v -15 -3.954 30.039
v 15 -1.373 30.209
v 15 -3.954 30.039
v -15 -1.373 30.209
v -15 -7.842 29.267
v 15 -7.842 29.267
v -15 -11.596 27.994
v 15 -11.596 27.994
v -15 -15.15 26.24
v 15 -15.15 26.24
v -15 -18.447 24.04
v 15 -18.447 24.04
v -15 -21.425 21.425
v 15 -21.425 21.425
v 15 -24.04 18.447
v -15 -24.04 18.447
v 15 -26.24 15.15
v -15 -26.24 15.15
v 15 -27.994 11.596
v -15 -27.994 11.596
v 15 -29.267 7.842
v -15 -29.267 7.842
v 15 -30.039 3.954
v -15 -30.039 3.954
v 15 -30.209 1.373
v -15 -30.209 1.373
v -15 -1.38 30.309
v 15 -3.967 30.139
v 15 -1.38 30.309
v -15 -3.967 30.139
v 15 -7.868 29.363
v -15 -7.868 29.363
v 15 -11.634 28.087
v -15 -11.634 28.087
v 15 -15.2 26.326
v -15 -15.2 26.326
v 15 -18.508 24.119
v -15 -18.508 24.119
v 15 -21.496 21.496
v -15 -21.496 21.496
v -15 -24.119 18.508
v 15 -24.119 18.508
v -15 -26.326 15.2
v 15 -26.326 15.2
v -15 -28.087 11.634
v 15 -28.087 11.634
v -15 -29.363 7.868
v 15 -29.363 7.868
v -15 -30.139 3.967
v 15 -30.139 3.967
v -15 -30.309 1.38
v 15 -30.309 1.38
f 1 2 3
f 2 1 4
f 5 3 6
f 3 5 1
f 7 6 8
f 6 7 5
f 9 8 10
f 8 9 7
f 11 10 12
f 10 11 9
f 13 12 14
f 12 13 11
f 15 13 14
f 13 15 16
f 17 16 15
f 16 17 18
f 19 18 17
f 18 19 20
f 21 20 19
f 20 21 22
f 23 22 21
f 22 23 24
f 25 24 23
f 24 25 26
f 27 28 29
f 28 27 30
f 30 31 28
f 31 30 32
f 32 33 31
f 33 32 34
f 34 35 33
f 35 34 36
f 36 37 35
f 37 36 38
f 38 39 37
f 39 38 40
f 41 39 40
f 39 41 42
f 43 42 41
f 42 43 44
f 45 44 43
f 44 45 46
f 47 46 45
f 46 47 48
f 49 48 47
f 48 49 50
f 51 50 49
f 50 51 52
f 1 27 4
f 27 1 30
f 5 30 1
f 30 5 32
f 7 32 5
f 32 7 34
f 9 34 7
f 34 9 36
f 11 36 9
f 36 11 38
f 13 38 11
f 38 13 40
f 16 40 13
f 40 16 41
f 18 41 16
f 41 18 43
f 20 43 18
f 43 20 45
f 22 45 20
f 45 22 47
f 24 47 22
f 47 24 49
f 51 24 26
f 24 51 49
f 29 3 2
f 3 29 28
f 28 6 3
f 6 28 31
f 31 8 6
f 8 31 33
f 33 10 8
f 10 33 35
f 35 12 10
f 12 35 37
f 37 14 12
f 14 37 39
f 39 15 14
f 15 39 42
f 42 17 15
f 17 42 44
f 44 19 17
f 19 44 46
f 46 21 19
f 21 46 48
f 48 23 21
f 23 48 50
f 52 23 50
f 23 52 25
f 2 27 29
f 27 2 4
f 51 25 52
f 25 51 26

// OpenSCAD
use <../lib.scad>
function ldraw_lib__6342869bc01() = [
// 0 Sticker  5.6 x  3.8 Rectangle Chrome (Formed)
// 0 Name: 6342869bc01.dat
// 0 Author: Orion Pobursky [OrionP]
// 0 !LDRAW_ORG Part UPDATE 2023-03
// 0 !LICENSE Licensed under CC BY 4.0 : see CAreadme.txt
// 
// 0 BFC CERTIFY CCW
  [0,"BFC","CERTIFY"],
  [0,"BFC","CCW"],
// 
// 0 !KEYWORDS Discovery, Space Shuttle, Set 10283
// 
// 0 !HISTORY 2023-06-24 [OrionP] Official Update 2023-03
// 
// 
// 4 383 -37.5 -75.0986 -9.8854 -37.5 -75.5237 -3.4334 37.5 -75.5237 -3.4334 37.5 -75.0986 -9.8854
  [4,383,-37.5,-75.0986,-9.8854,-37.5,-75.5237,-3.4334,37.5,-75.5237,-3.4334,37.5,-75.0986,-9.8854],
// 4 383 -37.5 -73.1669 -19.6041 -37.5 -75.0986 -9.8854 37.5 -75.0986 -9.8854 37.5 -73.1669 -19.6041
  [4,383,-37.5,-73.1669,-19.6041,-37.5,-75.0986,-9.8854,37.5,-75.0986,-9.8854,37.5,-73.1669,-19.6041],
// 4 383 -37.5 -69.9854 -28.9895 -37.5 -73.1669 -19.6041 37.5 -73.1669 -19.6041 37.5 -69.9854 -28.9895
  [4,383,-37.5,-69.9854,-28.9895,-37.5,-73.1669,-19.6041,37.5,-73.1669,-19.6041,37.5,-69.9854,-28.9895],
// 4 383 -37.5 -65.5995 -37.875 -37.5 -69.9854 -28.9895 37.5 -69.9854 -28.9895 37.5 -65.5995 -37.875
  [4,383,-37.5,-65.5995,-37.875,-37.5,-69.9854,-28.9895,37.5,-69.9854,-28.9895,37.5,-65.5995,-37.875],
// 4 383 -37.5 -60.1001 -46.1166 -37.5 -65.5995 -37.875 37.5 -65.5995 -37.875 37.5 -60.1001 -46.1166
  [4,383,-37.5,-60.1001,-46.1166,-37.5,-65.5995,-37.875,37.5,-65.5995,-37.875,37.5,-60.1001,-46.1166],
// 4 383 -37.5 -53.5628 -53.5628 -37.5 -60.1001 -46.1166 37.5 -60.1001 -46.1166 37.5 -53.5628 -53.5628
  [4,383,-37.5,-53.5628,-53.5628,-37.5,-60.1001,-46.1166,37.5,-60.1001,-46.1166,37.5,-53.5628,-53.5628],
// 4 383 -37.5 -46.1166 -60.1001 -37.5 -53.5628 -53.5628 37.5 -53.5628 -53.5628 37.5 -46.1166 -60.1001
  [4,383,-37.5,-46.1166,-60.1001,-37.5,-53.5628,-53.5628,37.5,-53.5628,-53.5628,37.5,-46.1166,-60.1001],
// 4 383 -37.5 -37.875 -65.5995 -37.5 -46.1166 -60.1001 37.5 -46.1166 -60.1001 37.5 -37.875 -65.5995
  [4,383,-37.5,-37.875,-65.5995,-37.5,-46.1166,-60.1001,37.5,-46.1166,-60.1001,37.5,-37.875,-65.5995],
// 4 383 -37.5 -28.9895 -69.9854 -37.5 -37.875 -65.5995 37.5 -37.875 -65.5995 37.5 -28.9895 -69.9854
  [4,383,-37.5,-28.9895,-69.9854,-37.5,-37.875,-65.5995,37.5,-37.875,-65.5995,37.5,-28.9895,-69.9854],
// 4 383 -37.5 -19.6041 -73.1669 -37.5 -28.9895 -69.9854 37.5 -28.9895 -69.9854 37.5 -19.6041 -73.1669
  [4,383,-37.5,-19.6041,-73.1669,-37.5,-28.9895,-69.9854,37.5,-28.9895,-69.9854,37.5,-19.6041,-73.1669],
// 4 383 -37.5 -9.8854 -75.0986 -37.5 -19.6041 -73.1669 37.5 -19.6041 -73.1669 37.5 -9.8854 -75.0986
  [4,383,-37.5,-9.8854,-75.0986,-37.5,-19.6041,-73.1669,37.5,-19.6041,-73.1669,37.5,-9.8854,-75.0986],
// 4 383 -37.5 -3.4334 -75.5237 -37.5 -9.8854 -75.0986 37.5 -9.8854 -75.0986 37.5 -3.4334 -75.5237
  [4,383,-37.5,-3.4334,-75.5237,-37.5,-9.8854,-75.0986,37.5,-9.8854,-75.0986,37.5,-3.4334,-75.5237],
// 
// 5 24 37.5 -75.0986 -9.8854 -37.5 -75.0986 -9.8854 37.5 -75.5237 -3.4334 37.5 -73.1669 -19.6041
  [5,24,37.5,-75.0986,-9.8854,-37.5,-75.0986,-9.8854,37.5,-75.5237,-3.4334,37.5,-73.1669,-19.6041],
// 5 24 37.5 -73.1669 -19.6041 -37.5 -73.1669 -19.6041 37.5 -75.0986 -9.8854 37.5 -69.9854 -28.9895
  [5,24,37.5,-73.1669,-19.6041,-37.5,-73.1669,-19.6041,37.5,-75.0986,-9.8854,37.5,-69.9854,-28.9895],
// 5 24 37.5 -69.9854 -28.9895 -37.5 -69.9854 -28.9895 37.5 -73.1669 -19.6041 37.5 -65.5995 -37.875
  [5,24,37.5,-69.9854,-28.9895,-37.5,-69.9854,-28.9895,37.5,-73.1669,-19.6041,37.5,-65.5995,-37.875],
// 5 24 37.5 -65.5995 -37.875 -37.5 -65.5995 -37.875 37.5 -69.9854 -28.9895 37.5 -60.1001 -46.1166
  [5,24,37.5,-65.5995,-37.875,-37.5,-65.5995,-37.875,37.5,-69.9854,-28.9895,37.5,-60.1001,-46.1166],
// 5 24 37.5 -60.1001 -46.1166 -37.5 -60.1001 -46.1166 37.5 -65.5995 -37.875 37.5 -53.5628 -53.5628
  [5,24,37.5,-60.1001,-46.1166,-37.5,-60.1001,-46.1166,37.5,-65.5995,-37.875,37.5,-53.5628,-53.5628],
// 5 24 37.5 -53.5628 -53.5628 -37.5 -53.5628 -53.5628 37.5 -60.1001 -46.1166 37.5 -46.1166 -60.1001
  [5,24,37.5,-53.5628,-53.5628,-37.5,-53.5628,-53.5628,37.5,-60.1001,-46.1166,37.5,-46.1166,-60.1001],
// 5 24 37.5 -46.1166 -60.1001 -37.5 -46.1166 -60.1001 37.5 -53.5628 -53.5628 37.5 -37.875 -65.5995
  [5,24,37.5,-46.1166,-60.1001,-37.5,-46.1166,-60.1001,37.5,-53.5628,-53.5628,37.5,-37.875,-65.5995],
// 5 24 37.5 -37.875 -65.5995 -37.5 -37.875 -65.5995 37.5 -46.1166 -60.1001 37.5 -28.9895 -69.9854
  [5,24,37.5,-37.875,-65.5995,-37.5,-37.875,-65.5995,37.5,-46.1166,-60.1001,37.5,-28.9895,-69.9854],
// 5 24 37.5 -28.9895 -69.9854 -37.5 -28.9895 -69.9854 37.5 -37.875 -65.5995 37.5 -19.6041 -73.1669
  [5,24,37.5,-28.9895,-69.9854,-37.5,-28.9895,-69.9854,37.5,-37.875,-65.5995,37.5,-19.6041,-73.1669],
// 5 24 37.5 -19.6041 -73.1669 -37.5 -19.6041 -73.1669 37.5 -28.9895 -69.9854 37.5 -9.8854 -75.0986
  [5,24,37.5,-19.6041,-73.1669,-37.5,-19.6041,-73.1669,37.5,-28.9895,-69.9854,37.5,-9.8854,-75.0986],
// 5 24 37.5 -9.8854 -75.0986 -37.5 -9.8854 -75.0986 37.5 -19.6041 -73.1669 37.5 -3.4334 -75.5237
  [5,24,37.5,-9.8854,-75.0986,-37.5,-9.8854,-75.0986,37.5,-19.6041,-73.1669,37.5,-3.4334,-75.5237],
// 
// 4 16 37.5 -75.7727 -3.4498 -37.5 -75.7727 -3.4498 -37.5 -75.3464 -9.918 37.5 -75.3464 -9.918
  [4,16,37.5,-75.7727,-3.4498,-37.5,-75.7727,-3.4498,-37.5,-75.3464,-9.918,37.5,-75.3464,-9.918],
// 4 16 37.5 -75.3464 -9.918 -37.5 -75.3464 -9.918 -37.5 -73.4084 -19.6688 37.5 -73.4084 -19.6688
  [4,16,37.5,-75.3464,-9.918,-37.5,-75.3464,-9.918,-37.5,-73.4084,-19.6688,37.5,-73.4084,-19.6688],
// 4 16 37.5 -73.4084 -19.6688 -37.5 -73.4084 -19.6688 -37.5 -70.2164 -29.0852 37.5 -70.2164 -29.0852
  [4,16,37.5,-73.4084,-19.6688,-37.5,-73.4084,-19.6688,-37.5,-70.2164,-29.0852,37.5,-70.2164,-29.0852],
// 4 16 37.5 -70.2164 -29.0852 -37.5 -70.2164 -29.0852 -37.5 -65.816 -38 37.5 -65.816 -38
  [4,16,37.5,-70.2164,-29.0852,-37.5,-70.2164,-29.0852,-37.5,-65.816,-38,37.5,-65.816,-38],
// 4 16 37.5 -65.816 -38 -37.5 -65.816 -38 -37.5 -60.2984 -46.2688 37.5 -60.2984 -46.2688
  [4,16,37.5,-65.816,-38,-37.5,-65.816,-38,-37.5,-60.2984,-46.2688,37.5,-60.2984,-46.2688],
// 4 16 37.5 -60.2984 -46.2688 -37.5 -60.2984 -46.2688 -37.5 -53.7396 -53.7396 37.5 -53.7396 -53.7396
  [4,16,37.5,-60.2984,-46.2688,-37.5,-60.2984,-46.2688,-37.5,-53.7396,-53.7396,37.5,-53.7396,-53.7396],
// 4 16 37.5 -53.7396 -53.7396 -37.5 -53.7396 -53.7396 -37.5 -46.2688 -60.2984 37.5 -46.2688 -60.2984
  [4,16,37.5,-53.7396,-53.7396,-37.5,-53.7396,-53.7396,-37.5,-46.2688,-60.2984,37.5,-46.2688,-60.2984],
// 4 16 37.5 -46.2688 -60.2984 -37.5 -46.2688 -60.2984 -37.5 -38 -65.816 37.5 -38 -65.816
  [4,16,37.5,-46.2688,-60.2984,-37.5,-46.2688,-60.2984,-37.5,-38,-65.816,37.5,-38,-65.816],
// 4 16 37.5 -38 -65.816 -37.5 -38 -65.816 -37.5 -29.0852 -70.2164 37.5 -29.0852 -70.2164
  [4,16,37.5,-38,-65.816,-37.5,-38,-65.816,-37.5,-29.0852,-70.2164,37.5,-29.0852,-70.2164],
// 4 16 37.5 -29.0852 -70.2164 -37.5 -29.0852 -70.2164 -37.5 -19.6688 -73.4084 37.5 -19.6688 -73.4084
  [4,16,37.5,-29.0852,-70.2164,-37.5,-29.0852,-70.2164,-37.5,-19.6688,-73.4084,37.5,-19.6688,-73.4084],
// 4 16 37.5 -19.6688 -73.4084 -37.5 -19.6688 -73.4084 -37.5 -9.918 -75.3464 37.5 -9.918 -75.3464
  [4,16,37.5,-19.6688,-73.4084,-37.5,-19.6688,-73.4084,-37.5,-9.918,-75.3464,37.5,-9.918,-75.3464],
// 4 16 37.5 -9.918 -75.3464 -37.5 -9.918 -75.3464 -37.5 -3.4498 -75.7727 37.5 -3.4498 -75.7727
  [4,16,37.5,-9.918,-75.3464,-37.5,-9.918,-75.3464,-37.5,-3.4498,-75.7727,37.5,-3.4498,-75.7727],
// 
// 5 24 37.5 -75.3464 -9.918 -37.5 -75.3464 -9.918 37.5 -75.7727 -3.4498 37.5 -73.4084 -19.6688
  [5,24,37.5,-75.3464,-9.918,-37.5,-75.3464,-9.918,37.5,-75.7727,-3.4498,37.5,-73.4084,-19.6688],
// 5 24 37.5 -73.4084 -19.6688 -37.5 -73.4084 -19.6688 37.5 -75.3464 -9.918 37.5 -70.2164 -29.0852
  [5,24,37.5,-73.4084,-19.6688,-37.5,-73.4084,-19.6688,37.5,-75.3464,-9.918,37.5,-70.2164,-29.0852],
// 5 24 37.5 -70.2164 -29.0852 -37.5 -70.2164 -29.0852 37.5 -73.4084 -19.6688 37.5 -65.816 -38
  [5,24,37.5,-70.2164,-29.0852,-37.5,-70.2164,-29.0852,37.5,-73.4084,-19.6688,37.5,-65.816,-38],
// 5 24 37.5 -65.816 -38 -37.5 -65.816 -38 37.5 -70.2164 -29.0852 37.5 -60.2984 -46.2688
  [5,24,37.5,-65.816,-38,-37.5,-65.816,-38,37.5,-70.2164,-29.0852,37.5,-60.2984,-46.2688],
// 5 24 37.5 -60.2984 -46.2688 -37.5 -60.2984 -46.2688 37.5 -65.816 -38 37.5 -53.7396 -53.7396
  [5,24,37.5,-60.2984,-46.2688,-37.5,-60.2984,-46.2688,37.5,-65.816,-38,37.5,-53.7396,-53.7396],
// 5 24 37.5 -53.7396 -53.7396 -37.5 -53.7396 -53.7396 37.5 -60.2984 -46.2688 37.5 -46.2688 -60.2984
  [5,24,37.5,-53.7396,-53.7396,-37.5,-53.7396,-53.7396,37.5,-60.2984,-46.2688,37.5,-46.2688,-60.2984],
// 5 24 37.5 -46.2688 -60.2984 -37.5 -46.2688 -60.2984 37.5 -53.7396 -53.7396 37.5 -38 -65.816
  [5,24,37.5,-46.2688,-60.2984,-37.5,-46.2688,-60.2984,37.5,-53.7396,-53.7396,37.5,-38,-65.816],
// 5 24 37.5 -38 -65.816 -37.5 -38 -65.816 37.5 -46.2688 -60.2984 37.5 -29.0852 -70.2164
  [5,24,37.5,-38,-65.816,-37.5,-38,-65.816,37.5,-46.2688,-60.2984,37.5,-29.0852,-70.2164],
// 5 24 37.5 -29.0852 -70.2164 -37.5 -29.0852 -70.2164 37.5 -38 -65.816 37.5 -19.6688 -73.4084
  [5,24,37.5,-29.0852,-70.2164,-37.5,-29.0852,-70.2164,37.5,-38,-65.816,37.5,-19.6688,-73.4084],
// 5 24 37.5 -19.6688 -73.4084 -37.5 -19.6688 -73.4084 37.5 -29.0852 -70.2164 37.5 -9.918 -75.3464
  [5,24,37.5,-19.6688,-73.4084,-37.5,-19.6688,-73.4084,37.5,-29.0852,-70.2164,37.5,-9.918,-75.3464],
// 5 24 37.5 -9.918 -75.3464 -37.5 -9.918 -75.3464 37.5 -19.6688 -73.4084 37.5 -3.4498 -75.7727
  [5,24,37.5,-9.918,-75.3464,-37.5,-9.918,-75.3464,37.5,-19.6688,-73.4084,37.5,-3.4498,-75.7727],
// 
// 4 16 -37.5 -75.0986 -9.8854 -37.5 -75.3464 -9.918 -37.5 -75.7727 -3.4498 -37.5 -75.5237 -3.4334
  [4,16,-37.5,-75.0986,-9.8854,-37.5,-75.3464,-9.918,-37.5,-75.7727,-3.4498,-37.5,-75.5237,-3.4334],
// 4 16 -37.5 -73.1669 -19.6041 -37.5 -73.4084 -19.6688 -37.5 -75.3464 -9.918 -37.5 -75.0986 -9.8854
  [4,16,-37.5,-73.1669,-19.6041,-37.5,-73.4084,-19.6688,-37.5,-75.3464,-9.918,-37.5,-75.0986,-9.8854],
// 4 16 -37.5 -69.9854 -28.9895 -37.5 -70.2164 -29.0852 -37.5 -73.4084 -19.6688 -37.5 -73.1669 -19.6041
  [4,16,-37.5,-69.9854,-28.9895,-37.5,-70.2164,-29.0852,-37.5,-73.4084,-19.6688,-37.5,-73.1669,-19.6041],
// 4 16 -37.5 -65.5995 -37.875 -37.5 -65.816 -38 -37.5 -70.2164 -29.0852 -37.5 -69.9854 -28.9895
  [4,16,-37.5,-65.5995,-37.875,-37.5,-65.816,-38,-37.5,-70.2164,-29.0852,-37.5,-69.9854,-28.9895],
// 4 16 -37.5 -60.1001 -46.1166 -37.5 -60.2984 -46.2688 -37.5 -65.816 -38 -37.5 -65.5995 -37.875
  [4,16,-37.5,-60.1001,-46.1166,-37.5,-60.2984,-46.2688,-37.5,-65.816,-38,-37.5,-65.5995,-37.875],
// 4 16 -37.5 -53.5628 -53.5628 -37.5 -53.7396 -53.7396 -37.5 -60.2984 -46.2688 -37.5 -60.1001 -46.1166
  [4,16,-37.5,-53.5628,-53.5628,-37.5,-53.7396,-53.7396,-37.5,-60.2984,-46.2688,-37.5,-60.1001,-46.1166],
// 4 16 -37.5 -46.1166 -60.1001 -37.5 -46.2688 -60.2984 -37.5 -53.7396 -53.7396 -37.5 -53.5628 -53.5628
  [4,16,-37.5,-46.1166,-60.1001,-37.5,-46.2688,-60.2984,-37.5,-53.7396,-53.7396,-37.5,-53.5628,-53.5628],
// 4 16 -37.5 -37.875 -65.5995 -37.5 -38 -65.816 -37.5 -46.2688 -60.2984 -37.5 -46.1166 -60.1001
  [4,16,-37.5,-37.875,-65.5995,-37.5,-38,-65.816,-37.5,-46.2688,-60.2984,-37.5,-46.1166,-60.1001],
// 4 16 -37.5 -28.9895 -69.9854 -37.5 -29.0852 -70.2164 -37.5 -38 -65.816 -37.5 -37.875 -65.5995
  [4,16,-37.5,-28.9895,-69.9854,-37.5,-29.0852,-70.2164,-37.5,-38,-65.816,-37.5,-37.875,-65.5995],
// 4 16 -37.5 -19.6041 -73.1669 -37.5 -19.6688 -73.4084 -37.5 -29.0852 -70.2164 -37.5 -28.9895 -69.9854
  [4,16,-37.5,-19.6041,-73.1669,-37.5,-19.6688,-73.4084,-37.5,-29.0852,-70.2164,-37.5,-28.9895,-69.9854],
// 4 16 -37.5 -9.8854 -75.0986 -37.5 -9.918 -75.3464 -37.5 -19.6688 -73.4084 -37.5 -19.6041 -73.1669
  [4,16,-37.5,-9.8854,-75.0986,-37.5,-9.918,-75.3464,-37.5,-19.6688,-73.4084,-37.5,-19.6041,-73.1669],
// 4 16 -37.5 -3.4334 -75.5237 -37.5 -3.4498 -75.7727 -37.5 -9.918 -75.3464 -37.5 -9.8854 -75.0986
  [4,16,-37.5,-3.4334,-75.5237,-37.5,-3.4498,-75.7727,-37.5,-9.918,-75.3464,-37.5,-9.8854,-75.0986],
// 
// 4 16 37.5 -75.7727 -3.4498 37.5 -75.3464 -9.918 37.5 -75.0986 -9.8854 37.5 -75.5237 -3.4334
  [4,16,37.5,-75.7727,-3.4498,37.5,-75.3464,-9.918,37.5,-75.0986,-9.8854,37.5,-75.5237,-3.4334],
// 4 16 37.5 -75.3464 -9.918 37.5 -73.4084 -19.6688 37.5 -73.1669 -19.6041 37.5 -75.0986 -9.8854
  [4,16,37.5,-75.3464,-9.918,37.5,-73.4084,-19.6688,37.5,-73.1669,-19.6041,37.5,-75.0986,-9.8854],
// 4 16 37.5 -73.4084 -19.6688 37.5 -70.2164 -29.0852 37.5 -69.9854 -28.9895 37.5 -73.1669 -19.6041
  [4,16,37.5,-73.4084,-19.6688,37.5,-70.2164,-29.0852,37.5,-69.9854,-28.9895,37.5,-73.1669,-19.6041],
// 4 16 37.5 -70.2164 -29.0852 37.5 -65.816 -38 37.5 -65.5995 -37.875 37.5 -69.9854 -28.9895
  [4,16,37.5,-70.2164,-29.0852,37.5,-65.816,-38,37.5,-65.5995,-37.875,37.5,-69.9854,-28.9895],
// 4 16 37.5 -65.816 -38 37.5 -60.2984 -46.2688 37.5 -60.1001 -46.1166 37.5 -65.5995 -37.875
  [4,16,37.5,-65.816,-38,37.5,-60.2984,-46.2688,37.5,-60.1001,-46.1166,37.5,-65.5995,-37.875],
// 4 16 37.5 -60.2984 -46.2688 37.5 -53.7396 -53.7396 37.5 -53.5628 -53.5628 37.5 -60.1001 -46.1166
  [4,16,37.5,-60.2984,-46.2688,37.5,-53.7396,-53.7396,37.5,-53.5628,-53.5628,37.5,-60.1001,-46.1166],
// 4 16 37.5 -53.7396 -53.7396 37.5 -46.2688 -60.2984 37.5 -46.1166 -60.1001 37.5 -53.5628 -53.5628
  [4,16,37.5,-53.7396,-53.7396,37.5,-46.2688,-60.2984,37.5,-46.1166,-60.1001,37.5,-53.5628,-53.5628],
// 4 16 37.5 -46.2688 -60.2984 37.5 -38 -65.816 37.5 -37.875 -65.5995 37.5 -46.1166 -60.1001
  [4,16,37.5,-46.2688,-60.2984,37.5,-38,-65.816,37.5,-37.875,-65.5995,37.5,-46.1166,-60.1001],
// 4 16 37.5 -38 -65.816 37.5 -29.0852 -70.2164 37.5 -28.9895 -69.9854 37.5 -37.875 -65.5995
  [4,16,37.5,-38,-65.816,37.5,-29.0852,-70.2164,37.5,-28.9895,-69.9854,37.5,-37.875,-65.5995],
// 4 16 37.5 -29.0852 -70.2164 37.5 -19.6688 -73.4084 37.5 -19.6041 -73.1669 37.5 -28.9895 -69.9854
  [4,16,37.5,-29.0852,-70.2164,37.5,-19.6688,-73.4084,37.5,-19.6041,-73.1669,37.5,-28.9895,-69.9854],
// 4 16 37.5 -19.6688 -73.4084 37.5 -9.918 -75.3464 37.5 -9.8854 -75.0986 37.5 -19.6041 -73.1669
  [4,16,37.5,-19.6688,-73.4084,37.5,-9.918,-75.3464,37.5,-9.8854,-75.0986,37.5,-19.6041,-73.1669],
// 4 16 37.5 -9.918 -75.3464 37.5 -3.4498 -75.7727 37.5 -3.4334 -75.5237 37.5 -9.8854 -75.0986
  [4,16,37.5,-9.918,-75.3464,37.5,-3.4498,-75.7727,37.5,-3.4334,-75.5237,37.5,-9.8854,-75.0986],
// 
// 4 16 -37.5 -75.7727 -3.4498 37.5 -75.7727 -3.4498 37.5 -75.5237 -3.4334 -37.5 -75.5237 -3.4334
  [4,16,-37.5,-75.7727,-3.4498,37.5,-75.7727,-3.4498,37.5,-75.5237,-3.4334,-37.5,-75.5237,-3.4334],
// 4 16 37.5 -3.4498 -75.7727 -37.5 -3.4498 -75.7727 -37.5 -3.4334 -75.5237 37.5 -3.4334 -75.5237
  [4,16,37.5,-3.4498,-75.7727,-37.5,-3.4498,-75.7727,-37.5,-3.4334,-75.5237,37.5,-3.4334,-75.5237],
];
module ldraw_lib__6342869bc01(step=0, col=false, unit=2/5, alt=false, line=0.2, solid=!$preview)
    makepoly(ldraw_lib__6342869bc01(), step=step, col=col, unit=unit, alt=alt, line=line, solid=solid);
ldraw_lib__6342869bc01(line=0.2);
